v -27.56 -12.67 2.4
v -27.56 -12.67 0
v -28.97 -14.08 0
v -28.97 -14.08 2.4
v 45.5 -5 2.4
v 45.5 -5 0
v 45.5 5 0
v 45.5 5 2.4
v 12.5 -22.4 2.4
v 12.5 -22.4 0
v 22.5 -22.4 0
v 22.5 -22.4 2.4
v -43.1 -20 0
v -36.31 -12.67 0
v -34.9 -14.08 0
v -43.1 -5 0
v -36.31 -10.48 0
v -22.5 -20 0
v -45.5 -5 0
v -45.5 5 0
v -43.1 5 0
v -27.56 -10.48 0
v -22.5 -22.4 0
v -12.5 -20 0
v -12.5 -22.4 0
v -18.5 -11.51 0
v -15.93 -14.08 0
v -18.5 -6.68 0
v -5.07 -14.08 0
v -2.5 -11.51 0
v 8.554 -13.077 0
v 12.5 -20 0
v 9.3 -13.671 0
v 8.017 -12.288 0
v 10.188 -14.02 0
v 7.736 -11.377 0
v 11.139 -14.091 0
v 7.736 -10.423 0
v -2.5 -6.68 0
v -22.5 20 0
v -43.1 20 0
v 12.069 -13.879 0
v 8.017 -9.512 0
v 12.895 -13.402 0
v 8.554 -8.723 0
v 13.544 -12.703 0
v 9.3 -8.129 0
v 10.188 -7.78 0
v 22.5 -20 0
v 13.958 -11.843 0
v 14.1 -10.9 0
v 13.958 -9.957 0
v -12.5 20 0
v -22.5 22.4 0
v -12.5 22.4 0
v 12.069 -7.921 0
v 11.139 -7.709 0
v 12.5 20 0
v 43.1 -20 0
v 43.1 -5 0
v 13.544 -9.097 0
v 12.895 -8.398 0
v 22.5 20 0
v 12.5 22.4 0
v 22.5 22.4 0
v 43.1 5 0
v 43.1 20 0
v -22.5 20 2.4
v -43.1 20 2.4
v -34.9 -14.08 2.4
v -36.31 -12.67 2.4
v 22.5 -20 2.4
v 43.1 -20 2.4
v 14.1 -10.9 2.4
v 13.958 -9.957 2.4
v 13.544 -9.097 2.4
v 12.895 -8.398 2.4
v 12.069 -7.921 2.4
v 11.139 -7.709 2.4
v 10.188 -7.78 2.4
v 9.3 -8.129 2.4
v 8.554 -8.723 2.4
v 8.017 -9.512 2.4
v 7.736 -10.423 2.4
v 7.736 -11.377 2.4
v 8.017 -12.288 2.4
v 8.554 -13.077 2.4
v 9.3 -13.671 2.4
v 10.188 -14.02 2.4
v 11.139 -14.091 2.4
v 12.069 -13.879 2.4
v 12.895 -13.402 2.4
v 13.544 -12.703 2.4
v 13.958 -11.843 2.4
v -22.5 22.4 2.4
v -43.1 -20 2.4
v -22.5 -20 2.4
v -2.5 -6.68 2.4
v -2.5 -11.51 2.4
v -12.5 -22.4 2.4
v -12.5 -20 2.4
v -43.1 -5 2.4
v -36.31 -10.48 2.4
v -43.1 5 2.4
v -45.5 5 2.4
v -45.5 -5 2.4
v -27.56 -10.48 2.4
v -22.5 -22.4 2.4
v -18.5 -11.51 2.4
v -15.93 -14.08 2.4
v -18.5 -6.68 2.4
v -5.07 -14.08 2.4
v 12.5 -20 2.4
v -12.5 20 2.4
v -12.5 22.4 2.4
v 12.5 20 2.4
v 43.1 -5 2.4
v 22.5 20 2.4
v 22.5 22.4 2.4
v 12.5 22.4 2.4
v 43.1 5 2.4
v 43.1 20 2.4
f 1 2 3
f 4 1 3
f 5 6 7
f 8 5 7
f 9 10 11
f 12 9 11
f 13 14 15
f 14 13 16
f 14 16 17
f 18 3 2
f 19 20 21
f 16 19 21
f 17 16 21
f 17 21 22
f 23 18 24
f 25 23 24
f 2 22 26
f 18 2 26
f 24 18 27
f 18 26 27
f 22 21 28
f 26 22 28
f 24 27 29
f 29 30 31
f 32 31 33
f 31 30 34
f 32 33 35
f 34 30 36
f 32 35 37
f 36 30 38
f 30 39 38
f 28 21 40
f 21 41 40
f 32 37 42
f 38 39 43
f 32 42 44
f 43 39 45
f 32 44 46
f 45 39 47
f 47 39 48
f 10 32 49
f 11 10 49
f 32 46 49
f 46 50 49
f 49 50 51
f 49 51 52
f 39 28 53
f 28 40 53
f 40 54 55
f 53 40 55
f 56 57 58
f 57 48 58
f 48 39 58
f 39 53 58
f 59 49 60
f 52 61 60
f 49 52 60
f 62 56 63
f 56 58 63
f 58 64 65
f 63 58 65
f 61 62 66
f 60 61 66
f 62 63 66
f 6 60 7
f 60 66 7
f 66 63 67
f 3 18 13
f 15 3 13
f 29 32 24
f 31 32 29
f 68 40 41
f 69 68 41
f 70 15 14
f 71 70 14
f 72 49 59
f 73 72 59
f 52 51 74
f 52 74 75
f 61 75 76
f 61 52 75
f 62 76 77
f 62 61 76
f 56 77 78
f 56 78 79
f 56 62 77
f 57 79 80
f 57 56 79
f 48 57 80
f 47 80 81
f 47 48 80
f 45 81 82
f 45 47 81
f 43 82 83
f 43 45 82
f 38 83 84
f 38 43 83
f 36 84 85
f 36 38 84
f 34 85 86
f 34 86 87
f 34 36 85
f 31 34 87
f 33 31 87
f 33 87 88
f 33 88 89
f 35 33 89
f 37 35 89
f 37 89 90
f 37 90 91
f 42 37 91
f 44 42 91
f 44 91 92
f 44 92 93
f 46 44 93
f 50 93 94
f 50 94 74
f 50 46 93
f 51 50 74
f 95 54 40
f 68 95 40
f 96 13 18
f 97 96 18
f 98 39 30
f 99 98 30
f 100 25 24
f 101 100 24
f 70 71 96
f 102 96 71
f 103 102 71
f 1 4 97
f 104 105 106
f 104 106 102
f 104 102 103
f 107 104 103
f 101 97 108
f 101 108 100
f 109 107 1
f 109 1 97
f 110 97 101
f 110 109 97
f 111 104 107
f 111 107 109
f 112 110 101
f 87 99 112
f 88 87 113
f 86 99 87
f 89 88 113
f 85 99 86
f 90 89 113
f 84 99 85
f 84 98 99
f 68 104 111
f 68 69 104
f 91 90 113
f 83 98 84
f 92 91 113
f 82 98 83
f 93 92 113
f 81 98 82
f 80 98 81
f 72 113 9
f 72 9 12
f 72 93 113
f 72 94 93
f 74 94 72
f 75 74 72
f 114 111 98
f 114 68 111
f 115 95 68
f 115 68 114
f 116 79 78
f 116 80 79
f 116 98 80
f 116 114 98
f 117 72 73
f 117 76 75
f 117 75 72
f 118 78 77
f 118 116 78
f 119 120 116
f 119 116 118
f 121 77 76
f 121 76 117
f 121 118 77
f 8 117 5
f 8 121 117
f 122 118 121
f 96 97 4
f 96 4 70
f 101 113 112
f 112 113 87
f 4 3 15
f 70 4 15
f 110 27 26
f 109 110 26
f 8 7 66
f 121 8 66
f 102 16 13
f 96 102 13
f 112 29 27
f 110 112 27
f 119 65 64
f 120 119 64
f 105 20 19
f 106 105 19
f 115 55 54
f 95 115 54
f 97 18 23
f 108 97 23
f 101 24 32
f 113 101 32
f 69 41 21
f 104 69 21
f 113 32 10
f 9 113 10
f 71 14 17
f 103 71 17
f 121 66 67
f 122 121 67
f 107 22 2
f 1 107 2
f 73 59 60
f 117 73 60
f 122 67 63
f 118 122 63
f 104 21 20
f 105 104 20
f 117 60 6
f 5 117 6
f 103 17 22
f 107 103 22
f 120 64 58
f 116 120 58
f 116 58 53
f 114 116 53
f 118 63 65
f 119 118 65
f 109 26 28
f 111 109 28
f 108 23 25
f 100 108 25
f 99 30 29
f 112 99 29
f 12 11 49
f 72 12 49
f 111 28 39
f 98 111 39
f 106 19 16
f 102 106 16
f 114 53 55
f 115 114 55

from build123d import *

# Parameters (mm, degrees)
F0_R     = 3.2
F1_DEPTH = 2.4


with BuildPart() as f1:
    # F0 (on Top) → F1 (new body)
    with BuildSketch(Plane.XY):
        Polygon((43.1, 5), (43.1, 20), (22.5, 20), (22.5, 22.4), (12.5, 22.4), (12.5, 20), (-12.5, 20), (-12.5, 22.4), (-22.5, 22.4), (-22.5, 20), (-43.1, 20), (-43.1, 5), (-45.5, 5), (-45.5, -5), (-43.1, -5), (-43.1, -20), (-22.5, -20), (-22.5, -22.4), (-12.5, -22.4), (-12.5, -20), (12.5, -20), (12.5, -22.4), (22.5, -22.4), (22.5, -20), (43.1, -20), (43.1, -5), (45.5, -5), (45.5, 5), align=None)
        Polygon((-36.31, -12.67), (-36.31, -10.48), (-27.56, -10.48), (-27.56, -12.67), (-28.97, -14.08), (-34.9, -14.08), align=None, mode=Mode.SUBTRACT)
        Polygon((-18.5, -11.51), (-18.5, -6.68), (-2.5, -6.68), (-2.5, -11.51), (-5.07, -14.08), (-15.93, -14.08), align=None, mode=Mode.SUBTRACT)
        with Locations((10.9, -10.9)):
            Circle(F0_R, mode=Mode.SUBTRACT)
    extrude(amount=F1_DEPTH)


solid = f1.part
